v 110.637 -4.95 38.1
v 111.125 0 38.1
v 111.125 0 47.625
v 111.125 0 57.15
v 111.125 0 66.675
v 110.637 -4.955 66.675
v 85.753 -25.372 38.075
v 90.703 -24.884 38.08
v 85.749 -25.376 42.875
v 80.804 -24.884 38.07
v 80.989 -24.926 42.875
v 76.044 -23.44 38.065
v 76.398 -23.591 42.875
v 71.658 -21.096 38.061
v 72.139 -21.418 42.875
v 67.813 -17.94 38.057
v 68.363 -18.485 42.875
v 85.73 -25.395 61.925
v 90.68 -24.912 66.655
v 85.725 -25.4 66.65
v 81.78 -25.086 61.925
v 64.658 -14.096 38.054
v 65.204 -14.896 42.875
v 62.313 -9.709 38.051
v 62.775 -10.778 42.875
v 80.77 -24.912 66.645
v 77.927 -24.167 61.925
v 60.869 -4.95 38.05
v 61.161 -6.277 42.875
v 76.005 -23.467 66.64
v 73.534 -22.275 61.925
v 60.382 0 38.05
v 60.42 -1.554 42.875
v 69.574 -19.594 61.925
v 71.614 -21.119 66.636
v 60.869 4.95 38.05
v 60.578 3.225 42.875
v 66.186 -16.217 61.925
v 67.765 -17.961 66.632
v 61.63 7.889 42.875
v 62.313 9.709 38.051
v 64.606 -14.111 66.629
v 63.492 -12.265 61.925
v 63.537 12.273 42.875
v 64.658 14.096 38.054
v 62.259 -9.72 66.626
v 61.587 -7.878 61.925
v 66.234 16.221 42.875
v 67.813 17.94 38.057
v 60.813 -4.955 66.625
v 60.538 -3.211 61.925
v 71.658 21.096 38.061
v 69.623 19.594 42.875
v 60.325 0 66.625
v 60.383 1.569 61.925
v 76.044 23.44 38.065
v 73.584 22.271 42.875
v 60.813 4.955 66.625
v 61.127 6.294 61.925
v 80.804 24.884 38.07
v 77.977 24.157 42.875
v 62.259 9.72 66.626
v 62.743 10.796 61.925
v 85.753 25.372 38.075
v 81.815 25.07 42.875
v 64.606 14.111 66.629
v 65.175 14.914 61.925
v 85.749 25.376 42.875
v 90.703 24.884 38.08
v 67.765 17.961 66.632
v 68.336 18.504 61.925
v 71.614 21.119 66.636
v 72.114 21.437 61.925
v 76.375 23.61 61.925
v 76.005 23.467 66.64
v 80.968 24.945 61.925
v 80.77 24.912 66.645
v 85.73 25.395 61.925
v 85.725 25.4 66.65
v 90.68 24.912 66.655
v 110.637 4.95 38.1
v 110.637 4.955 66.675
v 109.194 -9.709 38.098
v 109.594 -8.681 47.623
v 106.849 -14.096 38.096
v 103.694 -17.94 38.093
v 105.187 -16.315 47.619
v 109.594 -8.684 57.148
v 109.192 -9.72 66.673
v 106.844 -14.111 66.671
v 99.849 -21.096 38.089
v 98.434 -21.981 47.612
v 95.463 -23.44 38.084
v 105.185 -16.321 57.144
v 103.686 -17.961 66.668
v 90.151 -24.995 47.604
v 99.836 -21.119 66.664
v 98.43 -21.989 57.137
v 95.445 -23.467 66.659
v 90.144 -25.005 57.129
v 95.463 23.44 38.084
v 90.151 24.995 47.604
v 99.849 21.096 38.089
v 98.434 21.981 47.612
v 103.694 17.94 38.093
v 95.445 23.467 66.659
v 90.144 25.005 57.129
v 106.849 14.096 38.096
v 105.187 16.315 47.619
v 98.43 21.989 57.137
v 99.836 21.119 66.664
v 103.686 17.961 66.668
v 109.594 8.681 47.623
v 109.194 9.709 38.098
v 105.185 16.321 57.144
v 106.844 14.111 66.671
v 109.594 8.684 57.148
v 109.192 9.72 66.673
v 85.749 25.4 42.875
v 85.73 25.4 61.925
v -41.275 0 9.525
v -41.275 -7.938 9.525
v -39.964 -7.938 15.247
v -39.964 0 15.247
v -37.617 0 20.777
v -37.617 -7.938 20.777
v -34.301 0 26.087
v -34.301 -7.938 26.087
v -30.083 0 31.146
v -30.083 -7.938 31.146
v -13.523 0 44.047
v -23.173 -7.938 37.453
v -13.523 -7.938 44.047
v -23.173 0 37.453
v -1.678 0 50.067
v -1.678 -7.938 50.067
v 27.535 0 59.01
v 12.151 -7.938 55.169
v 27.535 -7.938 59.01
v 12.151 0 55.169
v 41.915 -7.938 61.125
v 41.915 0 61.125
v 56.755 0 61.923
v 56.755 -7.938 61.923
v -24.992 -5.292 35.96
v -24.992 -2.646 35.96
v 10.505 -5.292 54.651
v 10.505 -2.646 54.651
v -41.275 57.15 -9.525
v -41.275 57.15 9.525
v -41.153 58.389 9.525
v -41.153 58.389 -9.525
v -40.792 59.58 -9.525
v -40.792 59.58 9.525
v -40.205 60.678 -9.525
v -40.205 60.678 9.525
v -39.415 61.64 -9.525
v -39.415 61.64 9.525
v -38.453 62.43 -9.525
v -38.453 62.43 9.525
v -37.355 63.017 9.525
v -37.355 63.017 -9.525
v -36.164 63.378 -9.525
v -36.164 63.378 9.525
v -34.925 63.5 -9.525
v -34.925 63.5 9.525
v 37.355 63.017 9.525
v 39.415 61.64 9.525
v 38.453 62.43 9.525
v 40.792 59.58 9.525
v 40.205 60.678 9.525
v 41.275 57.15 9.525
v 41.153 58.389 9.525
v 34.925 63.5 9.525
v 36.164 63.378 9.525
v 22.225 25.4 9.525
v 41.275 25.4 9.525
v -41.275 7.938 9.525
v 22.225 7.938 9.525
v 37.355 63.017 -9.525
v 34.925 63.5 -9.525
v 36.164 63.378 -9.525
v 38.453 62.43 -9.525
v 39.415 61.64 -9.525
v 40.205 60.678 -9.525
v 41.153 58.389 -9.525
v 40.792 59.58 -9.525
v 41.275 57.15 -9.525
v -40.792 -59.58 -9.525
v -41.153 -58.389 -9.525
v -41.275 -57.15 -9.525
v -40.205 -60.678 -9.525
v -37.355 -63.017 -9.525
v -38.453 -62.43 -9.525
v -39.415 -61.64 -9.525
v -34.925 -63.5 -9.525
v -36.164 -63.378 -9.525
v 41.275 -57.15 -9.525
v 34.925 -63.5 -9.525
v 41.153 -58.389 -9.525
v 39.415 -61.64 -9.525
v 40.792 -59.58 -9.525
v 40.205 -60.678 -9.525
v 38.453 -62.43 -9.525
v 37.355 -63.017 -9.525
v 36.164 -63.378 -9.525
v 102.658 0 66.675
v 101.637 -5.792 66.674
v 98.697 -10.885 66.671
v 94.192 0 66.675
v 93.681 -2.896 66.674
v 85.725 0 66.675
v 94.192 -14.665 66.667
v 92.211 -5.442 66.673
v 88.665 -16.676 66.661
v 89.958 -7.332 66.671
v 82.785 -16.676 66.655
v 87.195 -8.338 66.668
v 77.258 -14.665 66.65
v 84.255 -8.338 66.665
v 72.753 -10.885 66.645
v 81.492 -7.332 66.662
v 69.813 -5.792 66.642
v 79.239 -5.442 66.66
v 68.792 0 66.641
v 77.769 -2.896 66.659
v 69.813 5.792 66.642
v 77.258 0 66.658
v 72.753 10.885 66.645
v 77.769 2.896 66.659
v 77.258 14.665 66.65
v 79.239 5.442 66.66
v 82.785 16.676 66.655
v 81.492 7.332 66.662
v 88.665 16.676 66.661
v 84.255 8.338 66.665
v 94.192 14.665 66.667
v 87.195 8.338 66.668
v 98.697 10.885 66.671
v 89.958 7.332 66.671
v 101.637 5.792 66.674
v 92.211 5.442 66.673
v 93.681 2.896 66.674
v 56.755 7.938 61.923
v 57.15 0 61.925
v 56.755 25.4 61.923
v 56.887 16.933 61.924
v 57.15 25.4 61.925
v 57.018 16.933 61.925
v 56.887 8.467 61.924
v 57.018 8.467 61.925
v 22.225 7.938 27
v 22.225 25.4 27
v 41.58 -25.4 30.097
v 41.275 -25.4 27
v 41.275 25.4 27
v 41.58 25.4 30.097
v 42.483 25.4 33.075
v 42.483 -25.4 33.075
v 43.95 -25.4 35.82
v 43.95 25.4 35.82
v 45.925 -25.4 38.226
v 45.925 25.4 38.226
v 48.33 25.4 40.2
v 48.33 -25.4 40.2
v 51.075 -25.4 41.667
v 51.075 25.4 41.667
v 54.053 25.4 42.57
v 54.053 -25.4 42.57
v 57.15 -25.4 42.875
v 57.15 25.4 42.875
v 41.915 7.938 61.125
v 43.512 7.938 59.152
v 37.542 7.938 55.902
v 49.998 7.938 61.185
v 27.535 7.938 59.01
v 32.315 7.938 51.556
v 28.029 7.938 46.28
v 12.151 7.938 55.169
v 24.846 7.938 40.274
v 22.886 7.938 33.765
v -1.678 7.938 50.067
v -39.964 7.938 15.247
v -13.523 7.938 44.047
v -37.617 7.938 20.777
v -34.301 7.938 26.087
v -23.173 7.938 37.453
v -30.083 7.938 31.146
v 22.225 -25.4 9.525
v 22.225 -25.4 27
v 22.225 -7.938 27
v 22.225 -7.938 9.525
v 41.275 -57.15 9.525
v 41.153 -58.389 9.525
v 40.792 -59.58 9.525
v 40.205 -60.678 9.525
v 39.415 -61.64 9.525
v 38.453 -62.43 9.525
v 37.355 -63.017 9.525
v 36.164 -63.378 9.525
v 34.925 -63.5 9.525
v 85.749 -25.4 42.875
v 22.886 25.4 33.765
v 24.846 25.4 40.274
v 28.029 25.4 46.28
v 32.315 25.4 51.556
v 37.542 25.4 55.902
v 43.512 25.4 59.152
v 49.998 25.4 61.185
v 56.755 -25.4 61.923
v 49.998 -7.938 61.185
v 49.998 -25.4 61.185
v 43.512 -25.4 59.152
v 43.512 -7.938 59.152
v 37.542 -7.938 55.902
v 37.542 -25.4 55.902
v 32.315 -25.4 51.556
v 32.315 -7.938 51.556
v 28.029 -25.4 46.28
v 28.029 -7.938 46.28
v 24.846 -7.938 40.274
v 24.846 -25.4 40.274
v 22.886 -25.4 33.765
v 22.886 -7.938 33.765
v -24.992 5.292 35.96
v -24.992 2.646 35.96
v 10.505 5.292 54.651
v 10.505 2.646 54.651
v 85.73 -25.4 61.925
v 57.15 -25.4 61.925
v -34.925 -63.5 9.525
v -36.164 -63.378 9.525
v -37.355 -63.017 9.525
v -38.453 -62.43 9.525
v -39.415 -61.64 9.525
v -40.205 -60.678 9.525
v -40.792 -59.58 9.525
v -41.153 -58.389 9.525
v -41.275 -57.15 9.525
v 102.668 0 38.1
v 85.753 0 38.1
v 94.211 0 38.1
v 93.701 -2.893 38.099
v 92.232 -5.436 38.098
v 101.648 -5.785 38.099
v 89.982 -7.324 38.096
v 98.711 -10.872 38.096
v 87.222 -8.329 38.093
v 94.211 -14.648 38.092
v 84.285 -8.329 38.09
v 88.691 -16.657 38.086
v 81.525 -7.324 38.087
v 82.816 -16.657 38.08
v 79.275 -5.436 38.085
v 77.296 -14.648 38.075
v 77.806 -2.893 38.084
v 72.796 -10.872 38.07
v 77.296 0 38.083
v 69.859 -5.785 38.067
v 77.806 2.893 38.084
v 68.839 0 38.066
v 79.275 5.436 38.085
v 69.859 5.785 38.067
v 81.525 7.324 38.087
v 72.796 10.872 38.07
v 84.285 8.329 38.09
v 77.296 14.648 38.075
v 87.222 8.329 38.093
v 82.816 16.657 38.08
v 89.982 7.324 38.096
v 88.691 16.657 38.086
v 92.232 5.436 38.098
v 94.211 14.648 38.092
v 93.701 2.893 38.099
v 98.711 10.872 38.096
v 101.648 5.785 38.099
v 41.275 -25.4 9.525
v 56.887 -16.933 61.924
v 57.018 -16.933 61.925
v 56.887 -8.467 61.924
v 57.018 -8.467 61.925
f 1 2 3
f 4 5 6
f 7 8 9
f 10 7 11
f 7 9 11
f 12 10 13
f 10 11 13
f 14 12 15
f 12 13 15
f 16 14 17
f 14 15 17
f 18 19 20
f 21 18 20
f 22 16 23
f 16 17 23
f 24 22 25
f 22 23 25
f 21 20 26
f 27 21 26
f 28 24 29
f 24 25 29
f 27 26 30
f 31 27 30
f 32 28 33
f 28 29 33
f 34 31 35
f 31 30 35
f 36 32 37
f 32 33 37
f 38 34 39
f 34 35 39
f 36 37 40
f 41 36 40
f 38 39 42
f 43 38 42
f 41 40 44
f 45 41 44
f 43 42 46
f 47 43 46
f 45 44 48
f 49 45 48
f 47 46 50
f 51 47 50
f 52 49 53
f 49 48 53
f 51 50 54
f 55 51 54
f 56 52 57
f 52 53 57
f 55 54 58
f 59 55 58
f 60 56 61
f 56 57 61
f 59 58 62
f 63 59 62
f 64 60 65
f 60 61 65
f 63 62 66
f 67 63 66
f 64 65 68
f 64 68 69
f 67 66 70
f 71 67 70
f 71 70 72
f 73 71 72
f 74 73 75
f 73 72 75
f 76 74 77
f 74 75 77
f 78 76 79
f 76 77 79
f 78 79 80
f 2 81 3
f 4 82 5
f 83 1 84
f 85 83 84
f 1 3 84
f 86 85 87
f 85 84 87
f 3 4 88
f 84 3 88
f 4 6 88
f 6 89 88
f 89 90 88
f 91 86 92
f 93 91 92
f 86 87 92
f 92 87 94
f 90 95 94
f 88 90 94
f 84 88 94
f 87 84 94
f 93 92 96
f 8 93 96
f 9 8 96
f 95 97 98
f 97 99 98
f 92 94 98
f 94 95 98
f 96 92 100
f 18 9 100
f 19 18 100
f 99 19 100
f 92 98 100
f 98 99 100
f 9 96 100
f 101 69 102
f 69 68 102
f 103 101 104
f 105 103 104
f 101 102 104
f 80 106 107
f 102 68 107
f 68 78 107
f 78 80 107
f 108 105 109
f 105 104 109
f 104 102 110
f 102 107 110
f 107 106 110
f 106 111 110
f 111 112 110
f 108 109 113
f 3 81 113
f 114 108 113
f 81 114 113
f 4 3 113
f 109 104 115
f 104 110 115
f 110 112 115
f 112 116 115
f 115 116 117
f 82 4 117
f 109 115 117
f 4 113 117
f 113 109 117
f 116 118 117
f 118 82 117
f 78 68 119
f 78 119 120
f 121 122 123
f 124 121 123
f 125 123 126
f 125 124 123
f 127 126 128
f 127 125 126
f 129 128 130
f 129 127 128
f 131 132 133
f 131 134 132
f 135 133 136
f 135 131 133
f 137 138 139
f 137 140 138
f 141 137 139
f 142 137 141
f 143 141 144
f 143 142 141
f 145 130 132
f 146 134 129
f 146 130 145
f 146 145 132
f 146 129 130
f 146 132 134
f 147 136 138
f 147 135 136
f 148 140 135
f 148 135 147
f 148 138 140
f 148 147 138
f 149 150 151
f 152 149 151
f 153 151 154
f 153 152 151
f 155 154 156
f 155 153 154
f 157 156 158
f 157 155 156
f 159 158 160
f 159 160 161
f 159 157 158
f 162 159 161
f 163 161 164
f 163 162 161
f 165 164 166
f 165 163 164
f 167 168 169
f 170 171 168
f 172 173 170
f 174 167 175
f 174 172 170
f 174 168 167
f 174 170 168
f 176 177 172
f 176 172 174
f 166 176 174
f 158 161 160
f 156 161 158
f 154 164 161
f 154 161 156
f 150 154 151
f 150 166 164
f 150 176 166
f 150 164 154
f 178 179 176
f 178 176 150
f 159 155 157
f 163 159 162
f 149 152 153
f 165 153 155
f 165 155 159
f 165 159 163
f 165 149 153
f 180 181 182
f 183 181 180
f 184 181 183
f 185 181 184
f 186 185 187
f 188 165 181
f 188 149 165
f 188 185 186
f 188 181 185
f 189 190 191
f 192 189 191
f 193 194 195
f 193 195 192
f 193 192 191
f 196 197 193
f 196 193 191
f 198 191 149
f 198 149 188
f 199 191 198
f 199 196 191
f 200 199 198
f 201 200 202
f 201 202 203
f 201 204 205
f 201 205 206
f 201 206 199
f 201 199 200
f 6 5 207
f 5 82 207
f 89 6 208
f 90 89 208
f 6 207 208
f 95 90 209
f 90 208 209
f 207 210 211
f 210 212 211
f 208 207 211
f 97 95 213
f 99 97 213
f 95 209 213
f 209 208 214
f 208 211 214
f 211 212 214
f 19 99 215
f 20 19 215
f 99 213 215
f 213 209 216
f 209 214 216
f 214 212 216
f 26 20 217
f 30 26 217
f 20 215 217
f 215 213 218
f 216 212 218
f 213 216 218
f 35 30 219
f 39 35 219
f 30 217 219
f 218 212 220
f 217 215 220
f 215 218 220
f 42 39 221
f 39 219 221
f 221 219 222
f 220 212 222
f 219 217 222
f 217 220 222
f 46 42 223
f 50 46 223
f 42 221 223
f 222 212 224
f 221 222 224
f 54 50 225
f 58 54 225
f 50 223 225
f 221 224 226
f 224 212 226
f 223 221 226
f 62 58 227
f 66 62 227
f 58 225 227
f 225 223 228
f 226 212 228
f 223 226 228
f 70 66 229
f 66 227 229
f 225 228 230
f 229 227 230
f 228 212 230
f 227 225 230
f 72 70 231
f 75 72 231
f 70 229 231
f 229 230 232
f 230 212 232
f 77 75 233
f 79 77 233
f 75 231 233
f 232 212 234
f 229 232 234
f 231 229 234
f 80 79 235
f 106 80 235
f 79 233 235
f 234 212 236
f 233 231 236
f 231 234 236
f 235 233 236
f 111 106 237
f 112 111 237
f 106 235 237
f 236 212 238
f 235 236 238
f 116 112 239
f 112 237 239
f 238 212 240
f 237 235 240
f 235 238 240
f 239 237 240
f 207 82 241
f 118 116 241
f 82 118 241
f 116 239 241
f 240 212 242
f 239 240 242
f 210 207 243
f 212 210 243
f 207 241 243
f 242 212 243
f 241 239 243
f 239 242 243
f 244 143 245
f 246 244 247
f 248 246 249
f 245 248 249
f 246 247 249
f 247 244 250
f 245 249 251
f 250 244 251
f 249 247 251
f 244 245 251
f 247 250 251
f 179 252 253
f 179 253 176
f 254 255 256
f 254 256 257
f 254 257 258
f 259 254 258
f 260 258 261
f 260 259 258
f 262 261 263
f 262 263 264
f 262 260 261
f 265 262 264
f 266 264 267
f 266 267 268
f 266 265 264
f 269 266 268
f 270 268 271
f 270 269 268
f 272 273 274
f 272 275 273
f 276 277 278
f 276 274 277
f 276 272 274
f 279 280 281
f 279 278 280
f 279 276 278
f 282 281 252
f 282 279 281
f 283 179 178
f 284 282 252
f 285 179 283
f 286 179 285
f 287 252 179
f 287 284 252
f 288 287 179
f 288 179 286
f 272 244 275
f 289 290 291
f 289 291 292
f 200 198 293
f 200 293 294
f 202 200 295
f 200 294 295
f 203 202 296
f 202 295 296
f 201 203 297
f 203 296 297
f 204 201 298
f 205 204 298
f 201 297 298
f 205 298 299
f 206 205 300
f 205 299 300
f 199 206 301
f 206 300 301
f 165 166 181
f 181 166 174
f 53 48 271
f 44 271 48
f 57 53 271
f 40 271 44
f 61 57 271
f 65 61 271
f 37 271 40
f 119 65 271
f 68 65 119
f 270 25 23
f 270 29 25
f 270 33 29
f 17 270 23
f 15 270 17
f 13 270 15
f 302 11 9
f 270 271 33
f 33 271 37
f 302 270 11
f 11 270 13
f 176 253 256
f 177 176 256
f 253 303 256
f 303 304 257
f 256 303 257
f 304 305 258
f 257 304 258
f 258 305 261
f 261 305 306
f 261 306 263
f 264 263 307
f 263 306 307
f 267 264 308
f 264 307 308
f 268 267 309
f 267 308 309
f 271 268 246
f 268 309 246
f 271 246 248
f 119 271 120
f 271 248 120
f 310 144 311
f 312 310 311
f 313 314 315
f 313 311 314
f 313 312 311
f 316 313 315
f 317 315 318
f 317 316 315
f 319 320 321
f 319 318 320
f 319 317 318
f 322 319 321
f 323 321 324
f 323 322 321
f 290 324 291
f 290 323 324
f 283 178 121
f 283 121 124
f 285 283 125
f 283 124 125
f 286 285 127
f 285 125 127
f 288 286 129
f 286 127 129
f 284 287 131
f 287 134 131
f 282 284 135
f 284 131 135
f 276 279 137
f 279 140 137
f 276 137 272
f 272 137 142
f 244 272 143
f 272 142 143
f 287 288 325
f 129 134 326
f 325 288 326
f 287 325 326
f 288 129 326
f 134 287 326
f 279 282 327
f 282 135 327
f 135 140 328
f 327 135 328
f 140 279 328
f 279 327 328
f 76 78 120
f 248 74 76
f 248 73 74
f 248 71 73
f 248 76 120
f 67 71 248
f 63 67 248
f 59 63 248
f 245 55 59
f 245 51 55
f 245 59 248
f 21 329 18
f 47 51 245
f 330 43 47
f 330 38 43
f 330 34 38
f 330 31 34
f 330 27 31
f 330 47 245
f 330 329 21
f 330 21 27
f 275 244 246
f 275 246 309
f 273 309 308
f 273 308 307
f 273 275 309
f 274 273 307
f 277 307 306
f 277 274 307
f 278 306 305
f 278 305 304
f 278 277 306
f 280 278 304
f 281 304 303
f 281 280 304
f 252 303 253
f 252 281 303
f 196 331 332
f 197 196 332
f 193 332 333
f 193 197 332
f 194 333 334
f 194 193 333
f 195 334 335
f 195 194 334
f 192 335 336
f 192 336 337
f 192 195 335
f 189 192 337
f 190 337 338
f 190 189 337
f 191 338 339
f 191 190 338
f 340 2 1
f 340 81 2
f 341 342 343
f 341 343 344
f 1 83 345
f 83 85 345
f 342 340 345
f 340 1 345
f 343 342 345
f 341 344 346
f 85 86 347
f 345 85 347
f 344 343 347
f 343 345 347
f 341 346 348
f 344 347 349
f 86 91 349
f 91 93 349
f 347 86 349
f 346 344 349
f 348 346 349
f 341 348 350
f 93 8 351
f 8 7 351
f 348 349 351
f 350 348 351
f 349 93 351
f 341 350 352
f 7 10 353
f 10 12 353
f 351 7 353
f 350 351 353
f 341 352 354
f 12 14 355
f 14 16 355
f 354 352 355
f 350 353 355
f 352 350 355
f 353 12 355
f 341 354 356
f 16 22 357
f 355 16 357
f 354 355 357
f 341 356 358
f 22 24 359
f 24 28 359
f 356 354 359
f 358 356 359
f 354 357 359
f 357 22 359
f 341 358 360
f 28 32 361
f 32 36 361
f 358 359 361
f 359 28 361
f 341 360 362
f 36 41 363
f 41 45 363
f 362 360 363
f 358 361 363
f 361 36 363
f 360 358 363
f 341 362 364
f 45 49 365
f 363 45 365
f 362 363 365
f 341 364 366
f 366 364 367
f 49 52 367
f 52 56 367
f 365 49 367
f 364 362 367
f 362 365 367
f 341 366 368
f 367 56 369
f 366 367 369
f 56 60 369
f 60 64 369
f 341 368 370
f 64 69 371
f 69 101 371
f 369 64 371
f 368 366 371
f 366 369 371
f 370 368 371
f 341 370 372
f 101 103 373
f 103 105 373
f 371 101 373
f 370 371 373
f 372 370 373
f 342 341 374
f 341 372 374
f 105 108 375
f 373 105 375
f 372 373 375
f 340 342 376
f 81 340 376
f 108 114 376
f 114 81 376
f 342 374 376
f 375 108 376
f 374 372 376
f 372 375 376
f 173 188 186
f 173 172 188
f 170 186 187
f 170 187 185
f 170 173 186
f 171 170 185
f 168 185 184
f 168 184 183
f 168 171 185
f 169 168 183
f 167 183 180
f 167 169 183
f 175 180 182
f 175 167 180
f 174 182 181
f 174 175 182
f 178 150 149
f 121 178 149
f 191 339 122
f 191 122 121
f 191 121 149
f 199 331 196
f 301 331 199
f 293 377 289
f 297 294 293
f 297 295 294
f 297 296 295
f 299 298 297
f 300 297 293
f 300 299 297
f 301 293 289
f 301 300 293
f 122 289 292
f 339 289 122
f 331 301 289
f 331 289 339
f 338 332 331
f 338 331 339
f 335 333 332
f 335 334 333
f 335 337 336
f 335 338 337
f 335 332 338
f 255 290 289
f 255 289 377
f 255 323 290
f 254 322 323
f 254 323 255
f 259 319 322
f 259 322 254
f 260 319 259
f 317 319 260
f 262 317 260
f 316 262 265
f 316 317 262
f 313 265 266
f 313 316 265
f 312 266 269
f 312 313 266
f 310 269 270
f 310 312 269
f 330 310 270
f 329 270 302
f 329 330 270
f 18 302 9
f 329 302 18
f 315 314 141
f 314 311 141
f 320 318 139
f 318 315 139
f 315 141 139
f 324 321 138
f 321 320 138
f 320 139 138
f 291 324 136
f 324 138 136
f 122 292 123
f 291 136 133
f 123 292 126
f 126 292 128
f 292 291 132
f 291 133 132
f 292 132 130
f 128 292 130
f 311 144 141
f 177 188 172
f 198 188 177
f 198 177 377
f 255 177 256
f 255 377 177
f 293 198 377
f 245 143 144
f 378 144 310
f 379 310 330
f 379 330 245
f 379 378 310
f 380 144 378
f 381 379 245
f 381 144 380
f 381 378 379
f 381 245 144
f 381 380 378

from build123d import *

# Parameters (mm, degrees)
F1_DEPTH = 63.5
F2_DEPTH = 25.4
F3_DEPTH = 7.9375
F5_R     = 6.35


with BuildPart() as f1:
    # F0 (on Front) → F1 (new body, symmetric)
    with BuildSketch(Plane.XZ):
        Polygon((22.225, 9.525), (-41.275, 9.525), (-41.275, -9.525), (41.275, -9.525), (41.275, 9.525), align=None)
    extrude(amount=F1_DEPTH, both=True)

    # F0 (on Front) → F2 (join, symmetric)
    with BuildSketch(Plane.XZ):
        with BuildLine():
            Line((22.225, 27.0002), (22.225, 9.525))
            Line((22.225, 9.525), (41.275, 9.525))
            Line((41.275, 9.525), (41.275, 27.0002))
            ThreePointArc((41.275, 27.0002), (45.9246798487, 38.2255201513), (57.15, 42.8752))
            Line((57.15, 42.8752), (60.325, 42.8752))
            Line((60.325, 42.8752), (60.325, 61.9252))
            Line((60.325, 61.9252), (57.15, 61.9252))
            add(Edge.make_bspline(
                [(56.7554491642, 61.9229712909), (56.8869413618, 61.9238786407), (57.0184585552, 61.9246216516), (57.15, 61.9252)],
                knots=[111.2049462729, 111.2049462729, 111.2049462729, 111.2049462729, 111.5045361635, 111.5045361635, 111.5045361635, 111.5045361635], degree=3))
            ThreePointArc((56.7554491642, 61.9229712909), (32.3151926428, 51.5560133347), (22.225, 27.0002))
        make_face()
        Polygon((85.7297200717, 61.9252), (60.325, 61.9252), (60.325, 42.8752), (85.7486508407, 42.8752), align=None)
    extrude(amount=F2_DEPTH, both=True)

    # F0 (on Front) → F3 (join, symmetric)
    with BuildSketch(Plane.XZ):
        with BuildLine():
            add(Edge.make_bspline(
                [(-41.275, 9.525), (-37.4179048528, 38.6063461027), (7.9467836295, 61.5861715867), (56.7554491642, 61.9229712909)],
                knots=[0, 0, 0, 0, 111.2049462729, 111.2049462729, 111.2049462729, 111.2049462729], degree=3))
            Line((-41.275, 9.525), (22.225, 9.525))
            Line((22.225, 9.525), (22.225, 27.0002))
            ThreePointArc((22.225, 27.0002), (32.3151926428, 51.5560133347), (56.7554491642, 61.9229712909))
        make_face()
    extrude(amount=F3_DEPTH, both=True)

    # F0 (on Front) → F4 (revolve)
    with BuildSketch(Plane.XZ):
        Polygon((85.725, 66.675), (85.7297200717, 61.9252), (85.7486508407, 42.8752), (85.7533961535, 38.1), (111.125, 38.1), (111.125, 66.675), align=None)
    revolve(axis=Axis((85.7391980767, 0, 52.3875), (0.0009937407, 0, -0.9999995062)))

    # F5
    f5_edges = [f1.edges().sort_by_distance(p)[0] for p in [
        (41.275, 63.5, 0),
        (41.275, -63.5, 0),
        (-41.275, 63.5, 0),
        (-41.275, -63.5, 0),
    ]]
    fillet(f5_edges, radius=F5_R)


solid = f1.part
